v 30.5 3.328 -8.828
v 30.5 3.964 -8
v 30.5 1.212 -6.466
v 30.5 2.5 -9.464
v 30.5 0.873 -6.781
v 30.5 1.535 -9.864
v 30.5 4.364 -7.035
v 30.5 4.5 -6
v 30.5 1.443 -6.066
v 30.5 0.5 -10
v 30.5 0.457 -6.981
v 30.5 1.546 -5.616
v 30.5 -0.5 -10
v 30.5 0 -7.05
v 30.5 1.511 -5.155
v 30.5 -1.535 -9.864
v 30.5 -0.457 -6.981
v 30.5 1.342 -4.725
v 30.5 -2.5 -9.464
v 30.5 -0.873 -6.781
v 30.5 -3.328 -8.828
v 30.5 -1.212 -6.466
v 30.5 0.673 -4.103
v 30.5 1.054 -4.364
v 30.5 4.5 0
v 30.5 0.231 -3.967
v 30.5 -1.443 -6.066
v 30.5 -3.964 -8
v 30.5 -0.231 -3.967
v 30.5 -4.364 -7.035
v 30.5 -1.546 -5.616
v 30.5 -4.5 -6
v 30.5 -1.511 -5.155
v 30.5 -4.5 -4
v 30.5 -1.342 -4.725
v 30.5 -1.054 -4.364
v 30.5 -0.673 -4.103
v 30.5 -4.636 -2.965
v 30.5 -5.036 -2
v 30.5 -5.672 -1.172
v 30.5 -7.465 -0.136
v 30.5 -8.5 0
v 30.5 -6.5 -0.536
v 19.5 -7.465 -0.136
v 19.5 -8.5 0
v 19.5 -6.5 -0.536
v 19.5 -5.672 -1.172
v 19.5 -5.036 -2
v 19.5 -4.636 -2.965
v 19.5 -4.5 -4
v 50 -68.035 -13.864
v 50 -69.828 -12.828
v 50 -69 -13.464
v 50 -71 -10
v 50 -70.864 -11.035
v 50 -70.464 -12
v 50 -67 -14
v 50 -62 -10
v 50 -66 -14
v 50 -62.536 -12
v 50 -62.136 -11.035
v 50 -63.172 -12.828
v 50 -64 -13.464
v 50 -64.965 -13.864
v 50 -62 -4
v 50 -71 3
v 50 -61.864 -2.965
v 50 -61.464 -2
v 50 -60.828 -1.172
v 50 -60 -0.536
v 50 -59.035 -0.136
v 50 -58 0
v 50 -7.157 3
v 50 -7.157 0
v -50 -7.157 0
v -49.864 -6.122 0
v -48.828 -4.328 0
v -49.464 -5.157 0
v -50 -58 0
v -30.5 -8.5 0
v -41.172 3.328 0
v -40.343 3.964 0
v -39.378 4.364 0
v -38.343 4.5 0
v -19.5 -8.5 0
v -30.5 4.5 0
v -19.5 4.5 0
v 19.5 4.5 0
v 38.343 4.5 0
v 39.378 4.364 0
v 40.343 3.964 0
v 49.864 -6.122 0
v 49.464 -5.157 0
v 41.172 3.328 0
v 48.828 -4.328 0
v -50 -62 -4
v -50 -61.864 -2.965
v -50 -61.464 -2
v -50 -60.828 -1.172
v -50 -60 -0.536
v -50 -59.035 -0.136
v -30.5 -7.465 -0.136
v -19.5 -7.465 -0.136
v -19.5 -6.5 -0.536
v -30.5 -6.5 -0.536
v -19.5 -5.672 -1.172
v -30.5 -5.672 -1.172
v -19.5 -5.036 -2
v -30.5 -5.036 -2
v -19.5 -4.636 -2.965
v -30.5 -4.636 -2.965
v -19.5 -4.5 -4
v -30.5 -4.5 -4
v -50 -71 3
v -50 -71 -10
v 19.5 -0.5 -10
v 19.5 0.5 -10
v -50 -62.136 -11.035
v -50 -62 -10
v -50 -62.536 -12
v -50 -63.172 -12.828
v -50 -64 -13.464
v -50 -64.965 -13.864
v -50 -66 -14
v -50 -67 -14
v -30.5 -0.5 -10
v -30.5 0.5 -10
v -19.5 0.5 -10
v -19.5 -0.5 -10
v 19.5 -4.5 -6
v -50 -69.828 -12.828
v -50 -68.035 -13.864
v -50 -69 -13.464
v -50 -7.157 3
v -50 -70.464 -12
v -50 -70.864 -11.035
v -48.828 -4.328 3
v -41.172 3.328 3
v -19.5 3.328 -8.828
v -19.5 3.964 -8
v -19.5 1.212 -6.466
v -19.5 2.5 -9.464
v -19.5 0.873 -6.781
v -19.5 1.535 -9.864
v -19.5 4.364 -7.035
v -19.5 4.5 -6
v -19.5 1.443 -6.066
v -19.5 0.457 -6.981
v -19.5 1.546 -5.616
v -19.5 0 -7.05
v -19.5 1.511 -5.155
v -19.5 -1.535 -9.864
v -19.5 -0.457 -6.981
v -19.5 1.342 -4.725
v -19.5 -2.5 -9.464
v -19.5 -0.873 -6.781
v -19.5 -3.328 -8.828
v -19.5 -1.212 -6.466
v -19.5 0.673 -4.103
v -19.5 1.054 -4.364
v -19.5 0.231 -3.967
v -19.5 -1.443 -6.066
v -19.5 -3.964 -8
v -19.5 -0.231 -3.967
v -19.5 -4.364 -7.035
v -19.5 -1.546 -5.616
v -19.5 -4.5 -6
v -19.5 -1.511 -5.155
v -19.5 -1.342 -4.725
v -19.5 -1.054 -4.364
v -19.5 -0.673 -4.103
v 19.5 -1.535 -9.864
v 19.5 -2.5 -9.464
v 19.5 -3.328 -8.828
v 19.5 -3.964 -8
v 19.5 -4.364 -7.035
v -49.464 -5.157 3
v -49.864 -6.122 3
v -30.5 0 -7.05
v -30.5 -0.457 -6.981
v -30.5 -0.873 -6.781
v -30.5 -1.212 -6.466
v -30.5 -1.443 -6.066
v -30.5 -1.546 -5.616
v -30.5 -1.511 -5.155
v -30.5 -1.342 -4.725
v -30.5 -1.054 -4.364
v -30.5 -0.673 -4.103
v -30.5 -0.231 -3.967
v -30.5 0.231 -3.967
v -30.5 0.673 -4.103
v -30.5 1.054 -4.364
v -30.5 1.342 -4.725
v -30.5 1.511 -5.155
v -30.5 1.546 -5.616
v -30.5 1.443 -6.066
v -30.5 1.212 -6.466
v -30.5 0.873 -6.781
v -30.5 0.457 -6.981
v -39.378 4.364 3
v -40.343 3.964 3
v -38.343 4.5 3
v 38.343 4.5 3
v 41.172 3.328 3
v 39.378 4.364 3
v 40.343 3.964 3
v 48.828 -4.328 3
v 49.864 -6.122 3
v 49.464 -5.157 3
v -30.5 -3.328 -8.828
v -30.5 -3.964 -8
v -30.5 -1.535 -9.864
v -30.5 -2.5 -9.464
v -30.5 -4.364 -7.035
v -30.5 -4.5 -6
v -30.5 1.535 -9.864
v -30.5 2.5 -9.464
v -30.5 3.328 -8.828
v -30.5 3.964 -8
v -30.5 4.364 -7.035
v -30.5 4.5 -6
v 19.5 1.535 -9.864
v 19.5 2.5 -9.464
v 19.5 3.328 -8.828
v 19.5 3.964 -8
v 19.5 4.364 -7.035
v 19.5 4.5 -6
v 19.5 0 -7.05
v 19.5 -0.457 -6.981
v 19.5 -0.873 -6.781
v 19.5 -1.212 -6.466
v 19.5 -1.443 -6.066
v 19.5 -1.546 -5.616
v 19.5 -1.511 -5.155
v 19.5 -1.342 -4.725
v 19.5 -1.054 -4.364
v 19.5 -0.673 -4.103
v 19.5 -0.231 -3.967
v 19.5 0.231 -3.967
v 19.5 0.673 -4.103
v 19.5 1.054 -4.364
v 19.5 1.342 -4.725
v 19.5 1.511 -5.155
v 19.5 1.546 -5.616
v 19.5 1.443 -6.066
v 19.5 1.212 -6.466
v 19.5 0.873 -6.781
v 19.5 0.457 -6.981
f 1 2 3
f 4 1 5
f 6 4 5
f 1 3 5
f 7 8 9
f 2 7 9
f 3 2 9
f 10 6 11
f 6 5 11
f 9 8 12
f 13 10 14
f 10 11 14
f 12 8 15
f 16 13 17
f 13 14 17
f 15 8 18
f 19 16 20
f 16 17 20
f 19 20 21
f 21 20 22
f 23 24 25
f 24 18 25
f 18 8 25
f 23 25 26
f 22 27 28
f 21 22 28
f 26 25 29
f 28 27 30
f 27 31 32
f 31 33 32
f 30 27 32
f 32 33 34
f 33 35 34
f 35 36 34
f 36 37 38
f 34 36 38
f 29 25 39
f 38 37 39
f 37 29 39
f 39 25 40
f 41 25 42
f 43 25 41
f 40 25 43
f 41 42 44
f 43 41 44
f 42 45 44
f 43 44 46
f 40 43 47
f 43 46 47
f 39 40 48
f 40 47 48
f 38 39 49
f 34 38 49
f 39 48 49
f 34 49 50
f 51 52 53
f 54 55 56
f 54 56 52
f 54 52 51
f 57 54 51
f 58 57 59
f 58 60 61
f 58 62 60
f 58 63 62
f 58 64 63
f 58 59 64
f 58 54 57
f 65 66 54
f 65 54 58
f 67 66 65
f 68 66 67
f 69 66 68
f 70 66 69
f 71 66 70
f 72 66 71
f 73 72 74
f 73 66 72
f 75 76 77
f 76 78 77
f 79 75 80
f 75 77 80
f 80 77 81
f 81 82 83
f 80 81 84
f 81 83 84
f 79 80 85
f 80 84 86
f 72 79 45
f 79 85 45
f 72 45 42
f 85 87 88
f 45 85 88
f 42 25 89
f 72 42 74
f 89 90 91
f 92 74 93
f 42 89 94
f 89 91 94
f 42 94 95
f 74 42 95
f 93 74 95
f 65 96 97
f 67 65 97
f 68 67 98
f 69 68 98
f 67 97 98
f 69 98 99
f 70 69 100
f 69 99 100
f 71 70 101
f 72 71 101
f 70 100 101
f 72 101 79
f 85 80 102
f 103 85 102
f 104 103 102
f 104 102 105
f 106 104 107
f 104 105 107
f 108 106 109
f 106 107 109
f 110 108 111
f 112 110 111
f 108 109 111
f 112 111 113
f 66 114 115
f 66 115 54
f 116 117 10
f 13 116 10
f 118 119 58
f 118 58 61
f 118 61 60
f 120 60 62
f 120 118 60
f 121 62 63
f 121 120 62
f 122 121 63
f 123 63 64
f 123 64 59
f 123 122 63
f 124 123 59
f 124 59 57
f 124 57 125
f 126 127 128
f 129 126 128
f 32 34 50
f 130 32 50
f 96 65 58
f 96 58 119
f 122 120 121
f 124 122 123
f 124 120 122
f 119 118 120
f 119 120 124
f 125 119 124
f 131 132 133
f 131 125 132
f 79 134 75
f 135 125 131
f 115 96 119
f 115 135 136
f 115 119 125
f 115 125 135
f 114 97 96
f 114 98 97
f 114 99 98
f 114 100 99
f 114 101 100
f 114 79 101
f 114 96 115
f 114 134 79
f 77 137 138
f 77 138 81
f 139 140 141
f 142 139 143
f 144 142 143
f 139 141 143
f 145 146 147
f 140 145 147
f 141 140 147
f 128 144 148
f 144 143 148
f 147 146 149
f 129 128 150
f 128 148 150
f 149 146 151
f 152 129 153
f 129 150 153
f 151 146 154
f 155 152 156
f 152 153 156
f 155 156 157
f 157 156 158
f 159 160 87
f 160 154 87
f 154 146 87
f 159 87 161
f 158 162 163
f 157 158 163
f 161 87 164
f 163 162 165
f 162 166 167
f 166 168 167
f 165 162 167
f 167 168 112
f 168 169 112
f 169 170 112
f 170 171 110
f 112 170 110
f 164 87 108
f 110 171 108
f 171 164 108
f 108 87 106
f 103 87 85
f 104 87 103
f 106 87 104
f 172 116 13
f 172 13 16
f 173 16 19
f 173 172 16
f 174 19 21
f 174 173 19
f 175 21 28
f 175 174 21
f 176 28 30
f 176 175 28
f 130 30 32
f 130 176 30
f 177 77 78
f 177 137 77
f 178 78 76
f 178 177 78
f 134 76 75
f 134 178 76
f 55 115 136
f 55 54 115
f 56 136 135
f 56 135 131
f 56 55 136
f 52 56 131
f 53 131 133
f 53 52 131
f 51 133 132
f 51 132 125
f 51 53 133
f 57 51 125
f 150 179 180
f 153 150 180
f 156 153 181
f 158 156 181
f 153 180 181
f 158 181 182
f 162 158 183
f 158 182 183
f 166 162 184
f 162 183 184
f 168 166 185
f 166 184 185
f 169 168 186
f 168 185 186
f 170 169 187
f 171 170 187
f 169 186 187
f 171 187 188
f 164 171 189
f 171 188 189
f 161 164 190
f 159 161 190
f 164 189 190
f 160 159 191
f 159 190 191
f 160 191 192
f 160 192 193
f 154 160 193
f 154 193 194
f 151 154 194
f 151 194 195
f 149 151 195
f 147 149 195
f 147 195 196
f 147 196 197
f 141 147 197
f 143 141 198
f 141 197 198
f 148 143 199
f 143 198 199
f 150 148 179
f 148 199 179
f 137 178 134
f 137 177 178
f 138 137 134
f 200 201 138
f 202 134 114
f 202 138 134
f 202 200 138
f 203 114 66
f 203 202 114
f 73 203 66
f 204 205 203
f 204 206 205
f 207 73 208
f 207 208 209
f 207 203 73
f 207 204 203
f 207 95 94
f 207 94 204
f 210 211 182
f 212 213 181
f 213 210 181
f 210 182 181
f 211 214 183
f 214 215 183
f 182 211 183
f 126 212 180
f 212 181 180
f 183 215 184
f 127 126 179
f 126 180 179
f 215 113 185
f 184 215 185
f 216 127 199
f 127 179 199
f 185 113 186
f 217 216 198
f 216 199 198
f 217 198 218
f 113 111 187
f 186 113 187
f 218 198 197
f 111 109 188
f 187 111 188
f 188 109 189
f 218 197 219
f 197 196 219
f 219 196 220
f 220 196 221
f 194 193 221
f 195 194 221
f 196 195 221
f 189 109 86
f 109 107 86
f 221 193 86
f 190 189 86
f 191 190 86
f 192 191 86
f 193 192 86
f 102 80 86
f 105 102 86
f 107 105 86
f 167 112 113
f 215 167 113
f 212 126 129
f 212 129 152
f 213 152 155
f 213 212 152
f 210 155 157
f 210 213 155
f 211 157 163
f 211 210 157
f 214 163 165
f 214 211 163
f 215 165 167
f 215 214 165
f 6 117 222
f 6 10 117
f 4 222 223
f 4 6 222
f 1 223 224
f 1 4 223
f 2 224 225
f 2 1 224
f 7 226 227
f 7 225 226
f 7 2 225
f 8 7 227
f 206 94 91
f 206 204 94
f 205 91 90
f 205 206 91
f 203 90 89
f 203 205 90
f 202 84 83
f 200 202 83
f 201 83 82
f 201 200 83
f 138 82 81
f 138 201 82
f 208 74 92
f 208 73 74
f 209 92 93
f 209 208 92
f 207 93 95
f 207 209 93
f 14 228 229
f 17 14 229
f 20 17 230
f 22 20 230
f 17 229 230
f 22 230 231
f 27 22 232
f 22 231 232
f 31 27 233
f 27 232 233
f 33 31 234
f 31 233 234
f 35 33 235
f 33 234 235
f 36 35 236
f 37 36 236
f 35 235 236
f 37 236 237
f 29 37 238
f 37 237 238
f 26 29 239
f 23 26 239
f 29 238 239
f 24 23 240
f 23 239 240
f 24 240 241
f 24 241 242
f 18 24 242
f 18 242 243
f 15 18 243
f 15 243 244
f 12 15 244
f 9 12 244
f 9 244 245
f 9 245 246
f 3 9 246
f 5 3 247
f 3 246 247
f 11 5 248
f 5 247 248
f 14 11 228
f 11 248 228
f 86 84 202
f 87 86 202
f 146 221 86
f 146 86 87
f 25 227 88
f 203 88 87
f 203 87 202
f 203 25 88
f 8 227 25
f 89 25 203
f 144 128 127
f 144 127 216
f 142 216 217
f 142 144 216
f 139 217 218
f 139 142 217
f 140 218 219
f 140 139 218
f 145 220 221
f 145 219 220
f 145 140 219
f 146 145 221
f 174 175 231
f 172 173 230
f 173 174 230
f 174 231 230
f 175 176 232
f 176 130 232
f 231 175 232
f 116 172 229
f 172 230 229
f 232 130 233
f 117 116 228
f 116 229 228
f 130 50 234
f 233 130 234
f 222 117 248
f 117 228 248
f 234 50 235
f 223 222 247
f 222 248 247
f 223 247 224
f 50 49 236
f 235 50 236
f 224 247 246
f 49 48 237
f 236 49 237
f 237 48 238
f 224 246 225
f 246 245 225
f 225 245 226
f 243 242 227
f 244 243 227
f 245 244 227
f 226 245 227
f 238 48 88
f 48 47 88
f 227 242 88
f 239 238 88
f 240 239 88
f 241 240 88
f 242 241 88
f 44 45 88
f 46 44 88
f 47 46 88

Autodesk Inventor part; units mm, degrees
ref_plane "YZ Plane" through (0, 0, 0) normal (1, 0, 0) x (0, 1, 0)
ref_plane "XZ Plane" through (0, 0, 0) normal (0, 1, 0) x (-1, 0, 0)
ref_plane "XY Plane" through (0, 0, 0) normal (0, 0, 1) x (1, 0, 0)
sketch "Sketch1" plane through (0, 0, 0) normal (0, 0, 1) x (1, 0, 0)
  line L0 (-30.5, 4.5) -> (-19.5, 4.5)
  line L1 (-19.5, 4.5) -> (-19.5, -4.5)
  line L2 (-19.5, -4.5) -> (-30.5, -4.5)
  line L3 (-30.5, -4.5) -> (-30.5, 4.5)
  line L4 (19.5, 4.5) -> (30.5, 4.5)
  line L5 (30.5, 4.5) -> (30.5, -4.5)
  line L6 (30.5, -4.5) -> (19.5, -4.5)
  line L7 (19.5, -4.5) -> (19.5, 4.5)
  line L8 (-50, 4.5) -> (50, 4.5)
  line L9 (50, 4.5) -> (50, -71)
  line L10 (50, -71) -> (-50, -71)
  line L11 (-50, -71) -> (-50, 4.5)
  point P0 (0, 0)
  dimension "d0" = 11
  dimension "d1" = 9
  dimension "d2" = 19.5
  dimension "d3" = 4.5
  dimension "d4" = 11
  dimension "d5" = 19.5
  dimension "d6" = 9
  dimension "d7" = 100
  dimension "d8" = 50
  dimension "d9" = 4.5
  dimension "d10" = 71
extrude "Extrusion1" add sketch "Sketch1" along normal blind 3
extrude "Extrusion2" add sketch "Sketch1" against normal blind 10 contours L0 L1 L2 L3 | L4 L5 L6 L7
sketch "Sketch2" plane through (30.5, -4.5, 0) normal (1, 0, 0) x (0, 0, -1)
  line L0 (0, 0) -> (0, 9) projected
  line L1 (0, 0) -> (10, 0) projected
  line L2 (10, 9) -> (10, 0) projected
  line L3 (0, 9) -> (10, 9) projected
  point P0 (0, 4.5)
  point P1 (5.5, 4.5)
  dimension "d15" = 4.5
  dimension "d16" = 4.5
hole "Hole1" at (30.5, 0, -5.5) direction (-1, 0, 0) diameter 3.1 end through all
fillet "Fillet1" radius 4 6 edges at (25, 4.5, -10) (25, -4.5, -10) (-25, -4.5, -10) (-25, 4.5, -10) (-25, -4.5, 0) (25, -4.5, 0)
chamfer "Chamfer1" distance 10 angle 45 2 edges at (50, 4.5, 1.5) (-50, 4.5, 1.5)
sketch "Sketch3" plane through (0, 0, 0) normal (0, 0, -1) x (-1, 0, 0)
  line L0 (40, 4.5) -> (50, -5.5) projected
  line L1 (30.5, 4.5) -> (40, 4.5) projected
  line L2 (30.5, 4.5) -> (30.5, -8.5) projected
  line L3 (19.5, -8.5) -> (30.5, -8.5) projected
  line L4 (19.5, -8.5) -> (19.5, 4.5) projected
  line L5 (-19.5, 4.5) -> (19.5, 4.5) projected
  line L6 (-19.5, 4.5) -> (-19.5, -8.5) projected
  line L7 (-30.5, -8.5) -> (-19.5, -8.5) projected
  line L8 (-30.5, -8.5) -> (-30.5, 4.5) projected
  line L9 (-40, 4.5) -> (-30.5, 4.5) projected
  line L10 (-50, -5.5) -> (-40, 4.5) projected
  line L11 (-50, -71) -> (-50, -5.5) projected
  line L12 (50, -71) -> (-50, -71) projected
  line L13 (50, -5.5) -> (50, -71) projected
  line L14 (-50, -62) -> (50, -62)
  point P0 (0, 0)
  dimension "d28" = 9
extrude "Extrusion3" add sketch "Sketch3" along normal blind 14 contours L13 L12 L11 L14
fillet "Fillet2" radius 4 3 edges at (0, -71, -14) (0, -62, -14) (0, -62, 0)
fillet "Fillet3" radius 4 4 edges at (-50, -5.5, 1.5) (-40, 4.5, 1.5) (40, 4.5, 1.5) (50, -5.5, 1.5)
equation "\"d3\" = 0.5 * d1"
equation "\"d4\" = d0"
equation "\"d5\" = d2"
equation "\"d8\" = 0.5 * d7"
equation "\"d16\" = d15"
properties part number "3DP_PLA_Stand_Leg"
